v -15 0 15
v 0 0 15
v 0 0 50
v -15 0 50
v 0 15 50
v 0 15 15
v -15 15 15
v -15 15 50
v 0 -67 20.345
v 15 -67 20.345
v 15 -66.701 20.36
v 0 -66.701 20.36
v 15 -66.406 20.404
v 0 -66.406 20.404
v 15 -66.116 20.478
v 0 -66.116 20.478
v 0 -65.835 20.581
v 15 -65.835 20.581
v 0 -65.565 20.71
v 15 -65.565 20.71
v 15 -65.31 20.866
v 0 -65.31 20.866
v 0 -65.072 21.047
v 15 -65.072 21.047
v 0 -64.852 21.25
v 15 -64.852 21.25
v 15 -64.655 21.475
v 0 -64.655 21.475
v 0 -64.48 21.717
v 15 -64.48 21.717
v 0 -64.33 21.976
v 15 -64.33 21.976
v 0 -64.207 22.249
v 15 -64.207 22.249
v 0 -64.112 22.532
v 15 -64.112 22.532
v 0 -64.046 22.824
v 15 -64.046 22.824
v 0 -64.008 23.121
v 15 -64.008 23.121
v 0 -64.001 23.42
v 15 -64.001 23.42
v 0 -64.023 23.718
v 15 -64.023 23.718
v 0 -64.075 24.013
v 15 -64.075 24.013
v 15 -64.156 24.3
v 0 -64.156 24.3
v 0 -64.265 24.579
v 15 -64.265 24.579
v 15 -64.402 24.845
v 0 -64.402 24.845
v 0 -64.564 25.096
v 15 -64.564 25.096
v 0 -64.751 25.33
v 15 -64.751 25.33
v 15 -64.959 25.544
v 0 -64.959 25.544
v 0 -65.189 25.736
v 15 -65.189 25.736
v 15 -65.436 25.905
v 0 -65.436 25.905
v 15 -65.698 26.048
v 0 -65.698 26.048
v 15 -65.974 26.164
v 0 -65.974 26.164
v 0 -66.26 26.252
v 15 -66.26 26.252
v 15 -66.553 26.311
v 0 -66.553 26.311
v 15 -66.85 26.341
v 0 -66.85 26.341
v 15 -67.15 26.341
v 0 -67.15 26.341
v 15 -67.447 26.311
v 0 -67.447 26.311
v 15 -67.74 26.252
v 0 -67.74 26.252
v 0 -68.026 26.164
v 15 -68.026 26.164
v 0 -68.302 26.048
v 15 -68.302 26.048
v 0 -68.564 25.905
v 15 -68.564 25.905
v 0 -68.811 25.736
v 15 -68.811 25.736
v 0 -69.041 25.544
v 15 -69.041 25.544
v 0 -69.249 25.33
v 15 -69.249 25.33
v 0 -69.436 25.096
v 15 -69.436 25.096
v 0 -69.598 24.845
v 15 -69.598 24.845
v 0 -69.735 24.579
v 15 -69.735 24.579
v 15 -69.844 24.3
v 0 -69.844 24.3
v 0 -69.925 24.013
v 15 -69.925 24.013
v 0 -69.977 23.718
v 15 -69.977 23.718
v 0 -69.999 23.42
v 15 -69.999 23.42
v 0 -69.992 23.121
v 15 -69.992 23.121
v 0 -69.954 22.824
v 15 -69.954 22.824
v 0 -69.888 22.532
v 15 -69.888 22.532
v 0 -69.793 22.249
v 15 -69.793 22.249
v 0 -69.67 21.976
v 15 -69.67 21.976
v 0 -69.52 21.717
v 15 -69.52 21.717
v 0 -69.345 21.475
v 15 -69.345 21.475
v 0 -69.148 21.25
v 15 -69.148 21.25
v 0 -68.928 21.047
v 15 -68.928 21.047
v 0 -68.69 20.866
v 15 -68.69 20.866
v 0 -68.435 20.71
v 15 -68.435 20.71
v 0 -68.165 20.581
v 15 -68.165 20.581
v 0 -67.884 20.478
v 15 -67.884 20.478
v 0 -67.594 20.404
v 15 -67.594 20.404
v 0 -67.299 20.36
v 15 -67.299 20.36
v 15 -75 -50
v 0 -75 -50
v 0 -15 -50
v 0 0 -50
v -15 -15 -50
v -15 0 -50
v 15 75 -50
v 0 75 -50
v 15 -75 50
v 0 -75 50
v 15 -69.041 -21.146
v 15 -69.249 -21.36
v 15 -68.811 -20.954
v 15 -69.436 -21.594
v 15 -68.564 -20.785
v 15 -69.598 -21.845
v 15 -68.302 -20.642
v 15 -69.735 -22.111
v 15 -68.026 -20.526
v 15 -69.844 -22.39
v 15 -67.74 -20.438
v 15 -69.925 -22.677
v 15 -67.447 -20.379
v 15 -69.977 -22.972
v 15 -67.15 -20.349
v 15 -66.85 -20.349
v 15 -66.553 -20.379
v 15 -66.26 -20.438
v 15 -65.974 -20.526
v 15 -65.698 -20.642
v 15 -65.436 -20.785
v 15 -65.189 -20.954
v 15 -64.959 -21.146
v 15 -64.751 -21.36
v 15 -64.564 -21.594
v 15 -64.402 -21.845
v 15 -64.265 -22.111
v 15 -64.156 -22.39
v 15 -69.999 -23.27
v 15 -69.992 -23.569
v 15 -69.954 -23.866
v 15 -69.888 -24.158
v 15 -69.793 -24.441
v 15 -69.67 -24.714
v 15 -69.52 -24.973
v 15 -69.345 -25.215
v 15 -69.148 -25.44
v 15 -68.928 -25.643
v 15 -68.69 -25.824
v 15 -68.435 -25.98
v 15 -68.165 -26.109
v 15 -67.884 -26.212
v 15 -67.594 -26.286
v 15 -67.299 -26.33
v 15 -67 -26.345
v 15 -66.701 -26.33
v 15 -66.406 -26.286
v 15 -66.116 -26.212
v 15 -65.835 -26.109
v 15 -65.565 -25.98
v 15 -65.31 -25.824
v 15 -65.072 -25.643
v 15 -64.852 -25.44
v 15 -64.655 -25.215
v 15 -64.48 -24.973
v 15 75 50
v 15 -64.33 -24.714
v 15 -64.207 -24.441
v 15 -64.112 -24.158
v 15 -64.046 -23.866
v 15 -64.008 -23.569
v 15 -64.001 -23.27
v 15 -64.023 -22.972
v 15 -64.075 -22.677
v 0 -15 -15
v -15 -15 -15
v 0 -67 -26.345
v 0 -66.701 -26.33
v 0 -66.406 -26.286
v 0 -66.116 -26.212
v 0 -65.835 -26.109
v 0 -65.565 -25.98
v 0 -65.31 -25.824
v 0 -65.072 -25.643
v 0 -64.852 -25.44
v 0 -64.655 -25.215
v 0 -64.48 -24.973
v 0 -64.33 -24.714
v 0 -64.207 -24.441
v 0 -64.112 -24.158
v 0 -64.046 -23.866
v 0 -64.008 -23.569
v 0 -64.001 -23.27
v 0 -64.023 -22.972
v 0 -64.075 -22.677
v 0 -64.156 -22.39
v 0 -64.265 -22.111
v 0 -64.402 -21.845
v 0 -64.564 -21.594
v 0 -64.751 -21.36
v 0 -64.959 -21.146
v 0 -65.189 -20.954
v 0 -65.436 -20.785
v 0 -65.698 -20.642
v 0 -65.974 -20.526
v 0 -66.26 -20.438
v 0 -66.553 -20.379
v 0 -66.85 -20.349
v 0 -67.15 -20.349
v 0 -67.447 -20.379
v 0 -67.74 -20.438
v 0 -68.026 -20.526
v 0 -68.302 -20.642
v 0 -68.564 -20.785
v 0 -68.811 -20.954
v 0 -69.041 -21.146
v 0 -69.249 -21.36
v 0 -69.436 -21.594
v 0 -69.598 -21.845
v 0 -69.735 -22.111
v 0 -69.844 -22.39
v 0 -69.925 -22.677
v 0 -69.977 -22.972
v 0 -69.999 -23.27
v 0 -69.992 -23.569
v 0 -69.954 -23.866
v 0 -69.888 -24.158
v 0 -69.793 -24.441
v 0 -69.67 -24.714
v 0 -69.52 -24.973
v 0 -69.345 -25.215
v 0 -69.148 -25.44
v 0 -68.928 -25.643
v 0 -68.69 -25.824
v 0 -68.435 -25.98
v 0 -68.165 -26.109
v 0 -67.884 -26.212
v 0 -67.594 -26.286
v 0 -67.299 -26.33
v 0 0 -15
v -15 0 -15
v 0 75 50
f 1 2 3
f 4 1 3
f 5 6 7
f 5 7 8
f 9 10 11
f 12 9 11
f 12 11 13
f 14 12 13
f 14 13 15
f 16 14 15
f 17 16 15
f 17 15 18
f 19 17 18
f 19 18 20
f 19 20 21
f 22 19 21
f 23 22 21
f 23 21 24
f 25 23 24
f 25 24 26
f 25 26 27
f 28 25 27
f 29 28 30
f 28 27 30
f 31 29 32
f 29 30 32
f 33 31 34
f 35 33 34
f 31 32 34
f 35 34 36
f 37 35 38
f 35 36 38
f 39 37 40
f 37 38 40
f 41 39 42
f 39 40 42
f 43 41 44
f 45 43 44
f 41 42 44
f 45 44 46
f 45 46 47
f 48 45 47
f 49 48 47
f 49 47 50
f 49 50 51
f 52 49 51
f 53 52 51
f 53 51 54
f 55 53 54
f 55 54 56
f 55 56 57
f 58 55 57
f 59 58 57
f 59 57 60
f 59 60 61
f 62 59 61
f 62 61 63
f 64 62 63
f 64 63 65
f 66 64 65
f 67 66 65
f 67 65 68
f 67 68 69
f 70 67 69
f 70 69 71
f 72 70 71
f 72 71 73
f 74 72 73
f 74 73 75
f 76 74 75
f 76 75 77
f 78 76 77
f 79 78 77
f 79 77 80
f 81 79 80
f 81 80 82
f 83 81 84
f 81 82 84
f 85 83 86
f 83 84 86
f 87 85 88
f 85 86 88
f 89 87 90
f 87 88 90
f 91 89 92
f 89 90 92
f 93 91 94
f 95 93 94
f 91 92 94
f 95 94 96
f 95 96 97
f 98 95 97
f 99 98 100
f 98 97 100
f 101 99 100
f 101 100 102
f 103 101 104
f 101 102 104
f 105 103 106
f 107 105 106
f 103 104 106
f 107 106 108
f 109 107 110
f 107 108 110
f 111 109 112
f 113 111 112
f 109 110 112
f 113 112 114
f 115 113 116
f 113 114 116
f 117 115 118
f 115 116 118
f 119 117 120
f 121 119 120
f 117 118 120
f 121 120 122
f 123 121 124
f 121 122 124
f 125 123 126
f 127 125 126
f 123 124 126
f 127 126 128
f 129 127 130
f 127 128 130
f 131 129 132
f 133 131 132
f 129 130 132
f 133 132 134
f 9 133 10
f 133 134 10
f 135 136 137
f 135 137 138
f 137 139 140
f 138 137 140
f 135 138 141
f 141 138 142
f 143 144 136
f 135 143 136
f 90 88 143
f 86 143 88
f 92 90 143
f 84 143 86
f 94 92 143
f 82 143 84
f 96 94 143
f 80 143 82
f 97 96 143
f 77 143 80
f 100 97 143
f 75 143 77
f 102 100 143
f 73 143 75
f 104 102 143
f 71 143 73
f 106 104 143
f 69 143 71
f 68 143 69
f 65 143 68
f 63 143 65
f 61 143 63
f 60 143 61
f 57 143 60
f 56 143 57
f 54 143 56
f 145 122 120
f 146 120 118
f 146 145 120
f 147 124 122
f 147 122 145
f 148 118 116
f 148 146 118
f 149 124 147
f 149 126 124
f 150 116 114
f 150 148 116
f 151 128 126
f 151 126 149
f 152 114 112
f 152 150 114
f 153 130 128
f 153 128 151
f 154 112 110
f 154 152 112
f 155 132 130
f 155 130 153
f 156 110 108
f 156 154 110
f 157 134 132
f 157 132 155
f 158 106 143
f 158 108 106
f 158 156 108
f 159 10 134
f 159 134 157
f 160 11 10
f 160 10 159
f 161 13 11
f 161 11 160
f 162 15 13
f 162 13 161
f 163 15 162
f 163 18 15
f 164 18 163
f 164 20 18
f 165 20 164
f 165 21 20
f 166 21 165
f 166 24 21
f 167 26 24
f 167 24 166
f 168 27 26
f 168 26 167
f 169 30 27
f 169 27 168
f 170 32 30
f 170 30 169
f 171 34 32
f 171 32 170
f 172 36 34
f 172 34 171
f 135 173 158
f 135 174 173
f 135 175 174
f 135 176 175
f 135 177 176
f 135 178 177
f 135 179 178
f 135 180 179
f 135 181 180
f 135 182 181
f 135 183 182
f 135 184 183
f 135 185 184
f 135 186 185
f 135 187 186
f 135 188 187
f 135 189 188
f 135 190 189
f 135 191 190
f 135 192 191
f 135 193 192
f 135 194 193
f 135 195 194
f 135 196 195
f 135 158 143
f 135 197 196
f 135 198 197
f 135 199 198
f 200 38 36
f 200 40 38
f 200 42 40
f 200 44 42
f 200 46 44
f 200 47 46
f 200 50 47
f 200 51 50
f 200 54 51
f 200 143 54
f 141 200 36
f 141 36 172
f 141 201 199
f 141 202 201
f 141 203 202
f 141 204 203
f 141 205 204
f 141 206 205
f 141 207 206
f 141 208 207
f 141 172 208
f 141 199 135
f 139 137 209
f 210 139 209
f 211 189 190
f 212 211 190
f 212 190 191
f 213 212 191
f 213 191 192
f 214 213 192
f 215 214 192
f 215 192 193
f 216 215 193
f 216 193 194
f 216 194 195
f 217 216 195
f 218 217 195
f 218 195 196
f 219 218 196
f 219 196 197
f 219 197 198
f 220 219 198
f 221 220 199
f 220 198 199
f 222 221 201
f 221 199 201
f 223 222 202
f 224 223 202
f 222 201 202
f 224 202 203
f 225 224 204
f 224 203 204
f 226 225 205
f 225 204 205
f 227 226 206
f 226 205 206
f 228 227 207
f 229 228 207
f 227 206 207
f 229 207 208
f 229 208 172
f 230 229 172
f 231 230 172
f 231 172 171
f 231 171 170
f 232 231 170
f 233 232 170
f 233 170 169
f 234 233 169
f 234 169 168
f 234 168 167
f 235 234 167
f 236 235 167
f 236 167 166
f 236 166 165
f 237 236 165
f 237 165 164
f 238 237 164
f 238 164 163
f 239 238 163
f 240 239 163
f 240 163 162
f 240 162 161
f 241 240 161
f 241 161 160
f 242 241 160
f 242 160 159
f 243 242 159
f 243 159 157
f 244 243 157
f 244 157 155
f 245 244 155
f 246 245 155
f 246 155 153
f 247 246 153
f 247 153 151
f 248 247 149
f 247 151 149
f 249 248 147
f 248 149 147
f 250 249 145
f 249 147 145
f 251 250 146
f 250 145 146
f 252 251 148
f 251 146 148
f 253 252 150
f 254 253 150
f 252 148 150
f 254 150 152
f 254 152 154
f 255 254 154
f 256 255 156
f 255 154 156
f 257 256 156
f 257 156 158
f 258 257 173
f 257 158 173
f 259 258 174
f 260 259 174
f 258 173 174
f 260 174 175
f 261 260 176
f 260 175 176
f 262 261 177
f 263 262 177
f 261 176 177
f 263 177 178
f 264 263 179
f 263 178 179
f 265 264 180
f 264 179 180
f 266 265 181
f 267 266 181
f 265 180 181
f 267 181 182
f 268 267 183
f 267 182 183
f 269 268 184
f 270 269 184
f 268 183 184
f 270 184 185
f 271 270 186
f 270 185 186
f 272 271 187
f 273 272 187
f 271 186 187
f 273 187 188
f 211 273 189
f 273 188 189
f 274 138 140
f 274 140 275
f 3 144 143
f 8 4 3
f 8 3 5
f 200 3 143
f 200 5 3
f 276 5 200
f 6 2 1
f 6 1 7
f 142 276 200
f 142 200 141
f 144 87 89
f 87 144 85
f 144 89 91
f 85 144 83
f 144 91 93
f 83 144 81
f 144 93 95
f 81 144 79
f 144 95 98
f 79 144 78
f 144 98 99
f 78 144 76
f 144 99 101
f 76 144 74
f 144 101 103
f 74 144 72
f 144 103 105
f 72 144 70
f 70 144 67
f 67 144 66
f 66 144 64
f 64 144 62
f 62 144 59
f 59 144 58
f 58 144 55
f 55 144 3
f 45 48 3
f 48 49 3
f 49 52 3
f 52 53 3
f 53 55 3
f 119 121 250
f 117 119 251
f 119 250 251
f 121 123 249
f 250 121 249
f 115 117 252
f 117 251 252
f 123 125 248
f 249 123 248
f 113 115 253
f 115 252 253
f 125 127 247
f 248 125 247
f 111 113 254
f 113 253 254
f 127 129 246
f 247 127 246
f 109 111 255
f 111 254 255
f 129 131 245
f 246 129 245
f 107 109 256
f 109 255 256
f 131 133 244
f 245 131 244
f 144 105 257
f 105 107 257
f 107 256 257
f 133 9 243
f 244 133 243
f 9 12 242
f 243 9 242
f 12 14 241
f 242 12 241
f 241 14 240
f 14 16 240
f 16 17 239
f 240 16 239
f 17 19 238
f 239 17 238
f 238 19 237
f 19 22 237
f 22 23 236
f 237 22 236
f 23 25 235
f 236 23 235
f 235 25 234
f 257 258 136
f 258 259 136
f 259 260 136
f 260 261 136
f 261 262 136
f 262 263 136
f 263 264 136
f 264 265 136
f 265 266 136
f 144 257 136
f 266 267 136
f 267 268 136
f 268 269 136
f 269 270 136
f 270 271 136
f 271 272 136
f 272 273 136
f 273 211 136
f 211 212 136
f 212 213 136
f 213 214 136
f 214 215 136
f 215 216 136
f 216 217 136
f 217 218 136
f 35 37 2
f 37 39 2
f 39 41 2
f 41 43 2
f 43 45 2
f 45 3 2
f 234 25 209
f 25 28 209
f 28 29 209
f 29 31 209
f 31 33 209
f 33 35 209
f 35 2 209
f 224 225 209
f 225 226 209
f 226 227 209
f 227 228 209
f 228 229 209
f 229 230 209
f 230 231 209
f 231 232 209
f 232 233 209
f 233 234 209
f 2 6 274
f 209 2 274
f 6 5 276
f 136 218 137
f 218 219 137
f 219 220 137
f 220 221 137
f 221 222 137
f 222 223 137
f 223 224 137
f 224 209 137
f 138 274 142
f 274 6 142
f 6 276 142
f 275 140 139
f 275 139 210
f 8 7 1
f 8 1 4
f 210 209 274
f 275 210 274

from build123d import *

# Parameters (mm, degrees)
CROQUIS1_W              = 100
CROQUIS1_H              = 150
SALIENTE_EXTRUIR1_DEPTH = 15
CROQUIS2_W              = 35
CROQUIS2_H              = 15
SALIENTE_EXTRUIR2_DEPTH = 15
CROQUIS3_R              = 3
CORTAR_EXTRUIR1_DEPTH   = 96


with BuildPart() as part:
    # Croquis1 → Saliente-Extruir1 (new body)
    with BuildSketch(Plane(origin=(0, 0, 0), x_dir=(0, 0, -1), z_dir=(1, 0, 0))):
        Rectangle(CROQUIS1_W, CROQUIS1_H)
    extrude(amount=SALIENTE_EXTRUIR1_DEPTH)

    # Croquis2 → Saliente-Extruir2 (add)
    with BuildSketch(Plane.ZY):
        with Locations((32.5, 7.5)):
            Rectangle(CROQUIS2_W, CROQUIS2_H)
        with Locations((-32.5, -7.5)):
            Rectangle(CROQUIS2_W, CROQUIS2_H)
    extrude(amount=SALIENTE_EXTRUIR2_DEPTH)

    # Croquis3 → Cortar-Extruir1 (cut, through all)
    with BuildSketch(Plane(origin=(15, 0, 0), x_dir=(0, 0, -1), z_dir=(1, 0, 0))):
        with Locations((-23.345, -67)):
            Circle(CROQUIS3_R)
        with Locations((23.345, -67)):
            Circle(CROQUIS3_R)
    extrude(amount=-CORTAR_EXTRUIR1_DEPTH, mode=Mode.SUBTRACT)


solid = part.part
